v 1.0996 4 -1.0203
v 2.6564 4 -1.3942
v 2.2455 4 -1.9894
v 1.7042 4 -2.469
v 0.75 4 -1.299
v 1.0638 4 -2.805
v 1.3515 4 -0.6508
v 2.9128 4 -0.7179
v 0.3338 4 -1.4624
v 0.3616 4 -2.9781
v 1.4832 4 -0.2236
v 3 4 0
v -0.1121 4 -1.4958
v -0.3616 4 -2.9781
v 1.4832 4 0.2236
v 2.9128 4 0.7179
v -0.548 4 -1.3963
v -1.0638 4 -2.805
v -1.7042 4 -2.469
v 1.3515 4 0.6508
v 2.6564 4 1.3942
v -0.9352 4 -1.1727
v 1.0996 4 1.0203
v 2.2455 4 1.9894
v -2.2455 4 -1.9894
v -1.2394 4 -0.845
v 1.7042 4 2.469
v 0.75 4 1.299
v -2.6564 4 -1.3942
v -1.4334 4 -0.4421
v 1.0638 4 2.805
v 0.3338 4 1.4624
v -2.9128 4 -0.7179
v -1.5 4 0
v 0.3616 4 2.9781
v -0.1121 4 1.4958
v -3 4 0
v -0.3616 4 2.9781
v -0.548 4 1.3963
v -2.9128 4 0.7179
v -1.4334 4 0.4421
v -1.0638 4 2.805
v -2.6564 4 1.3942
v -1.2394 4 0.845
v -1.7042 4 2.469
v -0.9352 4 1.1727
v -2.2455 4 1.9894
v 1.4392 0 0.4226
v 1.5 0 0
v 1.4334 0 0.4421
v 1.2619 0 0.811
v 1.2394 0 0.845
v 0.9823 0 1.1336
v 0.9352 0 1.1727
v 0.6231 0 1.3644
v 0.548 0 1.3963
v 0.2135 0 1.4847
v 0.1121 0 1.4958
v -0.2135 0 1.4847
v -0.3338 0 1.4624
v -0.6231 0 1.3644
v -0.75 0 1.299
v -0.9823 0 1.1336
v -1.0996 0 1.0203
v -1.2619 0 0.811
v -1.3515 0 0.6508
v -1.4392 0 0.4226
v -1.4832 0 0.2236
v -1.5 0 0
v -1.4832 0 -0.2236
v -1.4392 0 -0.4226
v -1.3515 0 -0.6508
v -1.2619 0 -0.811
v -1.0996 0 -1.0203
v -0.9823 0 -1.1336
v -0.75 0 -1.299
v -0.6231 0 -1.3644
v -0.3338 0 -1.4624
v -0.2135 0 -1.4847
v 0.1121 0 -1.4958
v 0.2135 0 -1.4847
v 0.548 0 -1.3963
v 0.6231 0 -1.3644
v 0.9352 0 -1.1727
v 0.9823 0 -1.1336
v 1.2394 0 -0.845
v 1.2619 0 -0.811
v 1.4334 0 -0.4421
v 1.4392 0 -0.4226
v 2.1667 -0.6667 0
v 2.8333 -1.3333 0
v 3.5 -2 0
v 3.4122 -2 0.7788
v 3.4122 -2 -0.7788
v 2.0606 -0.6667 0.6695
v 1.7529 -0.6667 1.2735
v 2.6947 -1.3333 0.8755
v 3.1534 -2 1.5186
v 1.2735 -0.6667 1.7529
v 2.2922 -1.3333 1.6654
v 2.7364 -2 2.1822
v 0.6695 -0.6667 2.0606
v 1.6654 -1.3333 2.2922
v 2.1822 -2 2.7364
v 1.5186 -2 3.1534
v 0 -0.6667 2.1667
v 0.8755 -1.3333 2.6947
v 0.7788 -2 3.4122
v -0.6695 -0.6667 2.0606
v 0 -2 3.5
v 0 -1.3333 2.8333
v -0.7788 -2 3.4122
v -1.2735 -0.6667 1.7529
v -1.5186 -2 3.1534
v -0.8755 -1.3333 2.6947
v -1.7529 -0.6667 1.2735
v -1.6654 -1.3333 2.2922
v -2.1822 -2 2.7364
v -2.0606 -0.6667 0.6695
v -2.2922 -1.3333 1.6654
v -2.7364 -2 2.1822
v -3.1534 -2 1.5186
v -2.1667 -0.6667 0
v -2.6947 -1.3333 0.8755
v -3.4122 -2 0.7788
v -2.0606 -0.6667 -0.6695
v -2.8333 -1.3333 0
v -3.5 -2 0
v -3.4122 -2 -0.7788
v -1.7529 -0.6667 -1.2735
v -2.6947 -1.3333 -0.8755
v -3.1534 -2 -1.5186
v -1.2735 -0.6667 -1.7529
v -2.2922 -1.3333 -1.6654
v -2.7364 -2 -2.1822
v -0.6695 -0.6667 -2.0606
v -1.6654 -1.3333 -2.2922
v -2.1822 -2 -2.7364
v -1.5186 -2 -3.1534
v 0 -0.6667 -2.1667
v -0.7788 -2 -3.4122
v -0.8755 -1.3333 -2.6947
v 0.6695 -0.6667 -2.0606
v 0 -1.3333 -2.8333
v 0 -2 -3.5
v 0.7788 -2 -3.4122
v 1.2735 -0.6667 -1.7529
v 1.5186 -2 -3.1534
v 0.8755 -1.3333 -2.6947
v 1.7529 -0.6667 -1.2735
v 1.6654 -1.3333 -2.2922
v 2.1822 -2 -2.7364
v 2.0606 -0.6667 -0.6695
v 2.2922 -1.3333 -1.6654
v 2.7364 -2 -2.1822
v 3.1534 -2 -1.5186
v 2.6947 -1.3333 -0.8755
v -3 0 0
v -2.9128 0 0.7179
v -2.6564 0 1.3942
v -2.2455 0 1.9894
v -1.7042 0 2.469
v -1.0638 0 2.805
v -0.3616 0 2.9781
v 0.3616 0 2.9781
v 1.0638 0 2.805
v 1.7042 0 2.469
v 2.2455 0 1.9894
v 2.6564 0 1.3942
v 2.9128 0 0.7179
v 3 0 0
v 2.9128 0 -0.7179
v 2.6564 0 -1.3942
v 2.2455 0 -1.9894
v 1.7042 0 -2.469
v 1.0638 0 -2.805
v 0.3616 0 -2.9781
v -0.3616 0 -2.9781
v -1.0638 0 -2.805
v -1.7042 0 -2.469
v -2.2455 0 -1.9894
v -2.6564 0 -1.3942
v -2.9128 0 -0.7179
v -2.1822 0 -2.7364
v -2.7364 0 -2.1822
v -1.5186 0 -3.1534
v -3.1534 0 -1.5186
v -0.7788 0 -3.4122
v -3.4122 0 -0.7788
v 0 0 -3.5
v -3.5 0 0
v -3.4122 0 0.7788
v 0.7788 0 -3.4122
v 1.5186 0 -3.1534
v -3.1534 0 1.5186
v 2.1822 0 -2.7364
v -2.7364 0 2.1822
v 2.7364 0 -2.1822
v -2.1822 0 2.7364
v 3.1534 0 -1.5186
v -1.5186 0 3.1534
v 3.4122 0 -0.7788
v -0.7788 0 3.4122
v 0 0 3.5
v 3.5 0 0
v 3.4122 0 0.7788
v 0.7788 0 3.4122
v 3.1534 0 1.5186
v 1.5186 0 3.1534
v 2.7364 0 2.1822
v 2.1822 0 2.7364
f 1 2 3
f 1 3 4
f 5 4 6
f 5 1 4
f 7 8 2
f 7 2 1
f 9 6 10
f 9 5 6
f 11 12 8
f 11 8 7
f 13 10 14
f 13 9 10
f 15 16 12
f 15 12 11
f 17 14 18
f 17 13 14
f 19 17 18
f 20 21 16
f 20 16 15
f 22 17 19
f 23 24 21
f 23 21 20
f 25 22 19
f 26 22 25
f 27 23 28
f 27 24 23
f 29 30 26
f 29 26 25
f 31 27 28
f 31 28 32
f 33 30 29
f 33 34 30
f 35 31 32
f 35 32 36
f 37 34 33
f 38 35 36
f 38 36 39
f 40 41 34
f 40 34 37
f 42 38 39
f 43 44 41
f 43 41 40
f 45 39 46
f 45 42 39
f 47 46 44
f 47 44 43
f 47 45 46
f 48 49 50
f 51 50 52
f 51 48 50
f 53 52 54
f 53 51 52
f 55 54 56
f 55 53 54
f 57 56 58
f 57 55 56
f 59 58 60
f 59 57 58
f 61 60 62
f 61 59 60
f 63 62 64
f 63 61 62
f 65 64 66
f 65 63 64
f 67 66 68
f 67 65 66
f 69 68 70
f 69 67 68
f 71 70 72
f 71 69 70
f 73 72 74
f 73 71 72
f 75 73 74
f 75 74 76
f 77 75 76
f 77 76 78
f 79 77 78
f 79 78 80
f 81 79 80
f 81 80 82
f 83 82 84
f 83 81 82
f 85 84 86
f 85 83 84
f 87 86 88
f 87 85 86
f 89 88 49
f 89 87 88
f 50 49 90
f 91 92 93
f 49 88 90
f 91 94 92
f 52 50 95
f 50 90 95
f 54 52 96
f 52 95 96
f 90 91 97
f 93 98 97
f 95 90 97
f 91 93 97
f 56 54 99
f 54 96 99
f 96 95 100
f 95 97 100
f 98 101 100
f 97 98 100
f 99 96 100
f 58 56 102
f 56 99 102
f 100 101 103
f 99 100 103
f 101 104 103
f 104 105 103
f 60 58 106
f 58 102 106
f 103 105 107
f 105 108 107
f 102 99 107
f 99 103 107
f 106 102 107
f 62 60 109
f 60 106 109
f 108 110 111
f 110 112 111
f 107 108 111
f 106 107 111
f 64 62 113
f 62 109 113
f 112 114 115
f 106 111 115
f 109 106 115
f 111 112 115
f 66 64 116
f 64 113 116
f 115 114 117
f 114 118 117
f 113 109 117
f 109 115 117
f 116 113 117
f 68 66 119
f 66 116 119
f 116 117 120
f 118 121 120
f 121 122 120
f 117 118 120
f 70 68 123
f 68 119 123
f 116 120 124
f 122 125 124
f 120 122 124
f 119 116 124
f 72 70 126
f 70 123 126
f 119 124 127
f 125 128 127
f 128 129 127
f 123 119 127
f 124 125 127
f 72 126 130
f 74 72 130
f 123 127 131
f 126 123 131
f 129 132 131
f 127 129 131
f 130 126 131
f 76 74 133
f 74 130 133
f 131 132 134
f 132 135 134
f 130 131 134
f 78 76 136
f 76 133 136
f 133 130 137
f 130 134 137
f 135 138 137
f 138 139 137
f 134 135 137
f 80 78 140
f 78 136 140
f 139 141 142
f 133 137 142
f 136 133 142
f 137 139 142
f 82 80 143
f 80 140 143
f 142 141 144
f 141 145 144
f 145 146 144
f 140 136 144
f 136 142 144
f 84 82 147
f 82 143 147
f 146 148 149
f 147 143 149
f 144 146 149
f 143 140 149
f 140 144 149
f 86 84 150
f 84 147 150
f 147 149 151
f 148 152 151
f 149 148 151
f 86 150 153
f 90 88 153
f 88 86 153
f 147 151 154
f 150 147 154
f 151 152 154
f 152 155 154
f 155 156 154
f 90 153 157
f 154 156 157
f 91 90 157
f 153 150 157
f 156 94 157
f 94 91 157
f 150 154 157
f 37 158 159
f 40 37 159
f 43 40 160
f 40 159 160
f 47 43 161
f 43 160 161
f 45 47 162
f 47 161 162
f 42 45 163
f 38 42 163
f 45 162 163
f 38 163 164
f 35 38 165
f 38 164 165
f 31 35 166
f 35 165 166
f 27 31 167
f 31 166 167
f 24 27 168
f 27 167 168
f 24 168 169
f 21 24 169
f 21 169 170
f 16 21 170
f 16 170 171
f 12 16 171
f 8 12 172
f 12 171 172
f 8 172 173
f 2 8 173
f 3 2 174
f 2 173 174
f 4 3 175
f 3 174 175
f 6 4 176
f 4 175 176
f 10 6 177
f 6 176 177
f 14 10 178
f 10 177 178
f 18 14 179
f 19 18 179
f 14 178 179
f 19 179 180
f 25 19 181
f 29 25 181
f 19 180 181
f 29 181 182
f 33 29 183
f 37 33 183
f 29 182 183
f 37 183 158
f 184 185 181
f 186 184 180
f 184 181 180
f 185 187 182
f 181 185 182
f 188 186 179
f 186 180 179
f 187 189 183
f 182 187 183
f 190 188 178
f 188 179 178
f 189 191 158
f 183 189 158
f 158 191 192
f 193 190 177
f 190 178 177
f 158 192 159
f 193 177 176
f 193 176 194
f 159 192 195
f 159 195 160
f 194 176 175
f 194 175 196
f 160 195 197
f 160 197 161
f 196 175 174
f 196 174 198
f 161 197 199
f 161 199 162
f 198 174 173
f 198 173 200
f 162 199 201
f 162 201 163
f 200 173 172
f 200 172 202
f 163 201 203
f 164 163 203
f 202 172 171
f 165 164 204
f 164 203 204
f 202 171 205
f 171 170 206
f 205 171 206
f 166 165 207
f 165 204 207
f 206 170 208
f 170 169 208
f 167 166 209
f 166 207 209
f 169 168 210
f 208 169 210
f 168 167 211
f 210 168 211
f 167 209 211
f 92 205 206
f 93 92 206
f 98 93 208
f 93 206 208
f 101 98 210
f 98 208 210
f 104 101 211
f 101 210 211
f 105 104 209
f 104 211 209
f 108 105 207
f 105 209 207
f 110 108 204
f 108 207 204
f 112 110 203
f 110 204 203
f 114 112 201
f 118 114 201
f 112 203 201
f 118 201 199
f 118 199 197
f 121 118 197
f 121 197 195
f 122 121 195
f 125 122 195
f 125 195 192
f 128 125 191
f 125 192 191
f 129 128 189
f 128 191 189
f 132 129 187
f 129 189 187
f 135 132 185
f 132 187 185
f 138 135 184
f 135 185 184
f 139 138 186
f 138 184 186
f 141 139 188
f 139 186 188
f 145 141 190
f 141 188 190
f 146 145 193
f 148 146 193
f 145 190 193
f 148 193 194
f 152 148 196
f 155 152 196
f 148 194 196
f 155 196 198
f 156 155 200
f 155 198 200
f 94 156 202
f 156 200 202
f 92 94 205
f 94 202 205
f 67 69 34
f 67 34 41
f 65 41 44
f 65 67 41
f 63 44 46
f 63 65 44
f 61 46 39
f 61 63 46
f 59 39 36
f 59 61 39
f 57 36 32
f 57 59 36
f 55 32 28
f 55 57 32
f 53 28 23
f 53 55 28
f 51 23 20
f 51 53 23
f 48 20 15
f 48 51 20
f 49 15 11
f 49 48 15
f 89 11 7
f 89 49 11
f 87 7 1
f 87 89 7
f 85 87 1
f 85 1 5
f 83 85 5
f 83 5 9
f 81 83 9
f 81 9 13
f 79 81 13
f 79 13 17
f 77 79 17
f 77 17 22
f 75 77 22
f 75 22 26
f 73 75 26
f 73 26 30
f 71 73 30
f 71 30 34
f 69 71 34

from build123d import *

# Parameters (mm, degrees)
F0_R     = 3.5
F0_R_2   = 1.5
F1_DEPTH = 2
F2_SIZE  = 1.99999
F3_R     = 3
F3_R_2   = 1.5
F4_DEPTH = 4


# Not quite as in the source:
# - a fillet or chamfer is up to 0.001 mm smaller than in the source, because OpenCascade refuses the exact size


with BuildPart() as f1:
    # F0 (on Front) → F1 (new body)
    with BuildSketch(Plane.XZ):
        Circle(F0_R)
        Circle(F0_R_2, mode=Mode.SUBTRACT)
    extrude(amount=F1_DEPTH)

    # F2 (size 2 in the source; OpenCascade refuses exactly that, so slightly less here)
    f2_edges = [f1.edges().sort_by_distance(p)[0] for p in [
        (-1.5, -2, 0),
    ]]
    chamfer(f2_edges, length=F2_SIZE)

    # F3 (on face) → F4 (join)
    with BuildSketch(Plane(origin=(0, 0, 0), x_dir=(-1, 0, 0), z_dir=(0, 1, 0))):
        Circle(F3_R)
        Circle(F3_R_2, mode=Mode.SUBTRACT)
    extrude(amount=F4_DEPTH)


solid = f1.part
